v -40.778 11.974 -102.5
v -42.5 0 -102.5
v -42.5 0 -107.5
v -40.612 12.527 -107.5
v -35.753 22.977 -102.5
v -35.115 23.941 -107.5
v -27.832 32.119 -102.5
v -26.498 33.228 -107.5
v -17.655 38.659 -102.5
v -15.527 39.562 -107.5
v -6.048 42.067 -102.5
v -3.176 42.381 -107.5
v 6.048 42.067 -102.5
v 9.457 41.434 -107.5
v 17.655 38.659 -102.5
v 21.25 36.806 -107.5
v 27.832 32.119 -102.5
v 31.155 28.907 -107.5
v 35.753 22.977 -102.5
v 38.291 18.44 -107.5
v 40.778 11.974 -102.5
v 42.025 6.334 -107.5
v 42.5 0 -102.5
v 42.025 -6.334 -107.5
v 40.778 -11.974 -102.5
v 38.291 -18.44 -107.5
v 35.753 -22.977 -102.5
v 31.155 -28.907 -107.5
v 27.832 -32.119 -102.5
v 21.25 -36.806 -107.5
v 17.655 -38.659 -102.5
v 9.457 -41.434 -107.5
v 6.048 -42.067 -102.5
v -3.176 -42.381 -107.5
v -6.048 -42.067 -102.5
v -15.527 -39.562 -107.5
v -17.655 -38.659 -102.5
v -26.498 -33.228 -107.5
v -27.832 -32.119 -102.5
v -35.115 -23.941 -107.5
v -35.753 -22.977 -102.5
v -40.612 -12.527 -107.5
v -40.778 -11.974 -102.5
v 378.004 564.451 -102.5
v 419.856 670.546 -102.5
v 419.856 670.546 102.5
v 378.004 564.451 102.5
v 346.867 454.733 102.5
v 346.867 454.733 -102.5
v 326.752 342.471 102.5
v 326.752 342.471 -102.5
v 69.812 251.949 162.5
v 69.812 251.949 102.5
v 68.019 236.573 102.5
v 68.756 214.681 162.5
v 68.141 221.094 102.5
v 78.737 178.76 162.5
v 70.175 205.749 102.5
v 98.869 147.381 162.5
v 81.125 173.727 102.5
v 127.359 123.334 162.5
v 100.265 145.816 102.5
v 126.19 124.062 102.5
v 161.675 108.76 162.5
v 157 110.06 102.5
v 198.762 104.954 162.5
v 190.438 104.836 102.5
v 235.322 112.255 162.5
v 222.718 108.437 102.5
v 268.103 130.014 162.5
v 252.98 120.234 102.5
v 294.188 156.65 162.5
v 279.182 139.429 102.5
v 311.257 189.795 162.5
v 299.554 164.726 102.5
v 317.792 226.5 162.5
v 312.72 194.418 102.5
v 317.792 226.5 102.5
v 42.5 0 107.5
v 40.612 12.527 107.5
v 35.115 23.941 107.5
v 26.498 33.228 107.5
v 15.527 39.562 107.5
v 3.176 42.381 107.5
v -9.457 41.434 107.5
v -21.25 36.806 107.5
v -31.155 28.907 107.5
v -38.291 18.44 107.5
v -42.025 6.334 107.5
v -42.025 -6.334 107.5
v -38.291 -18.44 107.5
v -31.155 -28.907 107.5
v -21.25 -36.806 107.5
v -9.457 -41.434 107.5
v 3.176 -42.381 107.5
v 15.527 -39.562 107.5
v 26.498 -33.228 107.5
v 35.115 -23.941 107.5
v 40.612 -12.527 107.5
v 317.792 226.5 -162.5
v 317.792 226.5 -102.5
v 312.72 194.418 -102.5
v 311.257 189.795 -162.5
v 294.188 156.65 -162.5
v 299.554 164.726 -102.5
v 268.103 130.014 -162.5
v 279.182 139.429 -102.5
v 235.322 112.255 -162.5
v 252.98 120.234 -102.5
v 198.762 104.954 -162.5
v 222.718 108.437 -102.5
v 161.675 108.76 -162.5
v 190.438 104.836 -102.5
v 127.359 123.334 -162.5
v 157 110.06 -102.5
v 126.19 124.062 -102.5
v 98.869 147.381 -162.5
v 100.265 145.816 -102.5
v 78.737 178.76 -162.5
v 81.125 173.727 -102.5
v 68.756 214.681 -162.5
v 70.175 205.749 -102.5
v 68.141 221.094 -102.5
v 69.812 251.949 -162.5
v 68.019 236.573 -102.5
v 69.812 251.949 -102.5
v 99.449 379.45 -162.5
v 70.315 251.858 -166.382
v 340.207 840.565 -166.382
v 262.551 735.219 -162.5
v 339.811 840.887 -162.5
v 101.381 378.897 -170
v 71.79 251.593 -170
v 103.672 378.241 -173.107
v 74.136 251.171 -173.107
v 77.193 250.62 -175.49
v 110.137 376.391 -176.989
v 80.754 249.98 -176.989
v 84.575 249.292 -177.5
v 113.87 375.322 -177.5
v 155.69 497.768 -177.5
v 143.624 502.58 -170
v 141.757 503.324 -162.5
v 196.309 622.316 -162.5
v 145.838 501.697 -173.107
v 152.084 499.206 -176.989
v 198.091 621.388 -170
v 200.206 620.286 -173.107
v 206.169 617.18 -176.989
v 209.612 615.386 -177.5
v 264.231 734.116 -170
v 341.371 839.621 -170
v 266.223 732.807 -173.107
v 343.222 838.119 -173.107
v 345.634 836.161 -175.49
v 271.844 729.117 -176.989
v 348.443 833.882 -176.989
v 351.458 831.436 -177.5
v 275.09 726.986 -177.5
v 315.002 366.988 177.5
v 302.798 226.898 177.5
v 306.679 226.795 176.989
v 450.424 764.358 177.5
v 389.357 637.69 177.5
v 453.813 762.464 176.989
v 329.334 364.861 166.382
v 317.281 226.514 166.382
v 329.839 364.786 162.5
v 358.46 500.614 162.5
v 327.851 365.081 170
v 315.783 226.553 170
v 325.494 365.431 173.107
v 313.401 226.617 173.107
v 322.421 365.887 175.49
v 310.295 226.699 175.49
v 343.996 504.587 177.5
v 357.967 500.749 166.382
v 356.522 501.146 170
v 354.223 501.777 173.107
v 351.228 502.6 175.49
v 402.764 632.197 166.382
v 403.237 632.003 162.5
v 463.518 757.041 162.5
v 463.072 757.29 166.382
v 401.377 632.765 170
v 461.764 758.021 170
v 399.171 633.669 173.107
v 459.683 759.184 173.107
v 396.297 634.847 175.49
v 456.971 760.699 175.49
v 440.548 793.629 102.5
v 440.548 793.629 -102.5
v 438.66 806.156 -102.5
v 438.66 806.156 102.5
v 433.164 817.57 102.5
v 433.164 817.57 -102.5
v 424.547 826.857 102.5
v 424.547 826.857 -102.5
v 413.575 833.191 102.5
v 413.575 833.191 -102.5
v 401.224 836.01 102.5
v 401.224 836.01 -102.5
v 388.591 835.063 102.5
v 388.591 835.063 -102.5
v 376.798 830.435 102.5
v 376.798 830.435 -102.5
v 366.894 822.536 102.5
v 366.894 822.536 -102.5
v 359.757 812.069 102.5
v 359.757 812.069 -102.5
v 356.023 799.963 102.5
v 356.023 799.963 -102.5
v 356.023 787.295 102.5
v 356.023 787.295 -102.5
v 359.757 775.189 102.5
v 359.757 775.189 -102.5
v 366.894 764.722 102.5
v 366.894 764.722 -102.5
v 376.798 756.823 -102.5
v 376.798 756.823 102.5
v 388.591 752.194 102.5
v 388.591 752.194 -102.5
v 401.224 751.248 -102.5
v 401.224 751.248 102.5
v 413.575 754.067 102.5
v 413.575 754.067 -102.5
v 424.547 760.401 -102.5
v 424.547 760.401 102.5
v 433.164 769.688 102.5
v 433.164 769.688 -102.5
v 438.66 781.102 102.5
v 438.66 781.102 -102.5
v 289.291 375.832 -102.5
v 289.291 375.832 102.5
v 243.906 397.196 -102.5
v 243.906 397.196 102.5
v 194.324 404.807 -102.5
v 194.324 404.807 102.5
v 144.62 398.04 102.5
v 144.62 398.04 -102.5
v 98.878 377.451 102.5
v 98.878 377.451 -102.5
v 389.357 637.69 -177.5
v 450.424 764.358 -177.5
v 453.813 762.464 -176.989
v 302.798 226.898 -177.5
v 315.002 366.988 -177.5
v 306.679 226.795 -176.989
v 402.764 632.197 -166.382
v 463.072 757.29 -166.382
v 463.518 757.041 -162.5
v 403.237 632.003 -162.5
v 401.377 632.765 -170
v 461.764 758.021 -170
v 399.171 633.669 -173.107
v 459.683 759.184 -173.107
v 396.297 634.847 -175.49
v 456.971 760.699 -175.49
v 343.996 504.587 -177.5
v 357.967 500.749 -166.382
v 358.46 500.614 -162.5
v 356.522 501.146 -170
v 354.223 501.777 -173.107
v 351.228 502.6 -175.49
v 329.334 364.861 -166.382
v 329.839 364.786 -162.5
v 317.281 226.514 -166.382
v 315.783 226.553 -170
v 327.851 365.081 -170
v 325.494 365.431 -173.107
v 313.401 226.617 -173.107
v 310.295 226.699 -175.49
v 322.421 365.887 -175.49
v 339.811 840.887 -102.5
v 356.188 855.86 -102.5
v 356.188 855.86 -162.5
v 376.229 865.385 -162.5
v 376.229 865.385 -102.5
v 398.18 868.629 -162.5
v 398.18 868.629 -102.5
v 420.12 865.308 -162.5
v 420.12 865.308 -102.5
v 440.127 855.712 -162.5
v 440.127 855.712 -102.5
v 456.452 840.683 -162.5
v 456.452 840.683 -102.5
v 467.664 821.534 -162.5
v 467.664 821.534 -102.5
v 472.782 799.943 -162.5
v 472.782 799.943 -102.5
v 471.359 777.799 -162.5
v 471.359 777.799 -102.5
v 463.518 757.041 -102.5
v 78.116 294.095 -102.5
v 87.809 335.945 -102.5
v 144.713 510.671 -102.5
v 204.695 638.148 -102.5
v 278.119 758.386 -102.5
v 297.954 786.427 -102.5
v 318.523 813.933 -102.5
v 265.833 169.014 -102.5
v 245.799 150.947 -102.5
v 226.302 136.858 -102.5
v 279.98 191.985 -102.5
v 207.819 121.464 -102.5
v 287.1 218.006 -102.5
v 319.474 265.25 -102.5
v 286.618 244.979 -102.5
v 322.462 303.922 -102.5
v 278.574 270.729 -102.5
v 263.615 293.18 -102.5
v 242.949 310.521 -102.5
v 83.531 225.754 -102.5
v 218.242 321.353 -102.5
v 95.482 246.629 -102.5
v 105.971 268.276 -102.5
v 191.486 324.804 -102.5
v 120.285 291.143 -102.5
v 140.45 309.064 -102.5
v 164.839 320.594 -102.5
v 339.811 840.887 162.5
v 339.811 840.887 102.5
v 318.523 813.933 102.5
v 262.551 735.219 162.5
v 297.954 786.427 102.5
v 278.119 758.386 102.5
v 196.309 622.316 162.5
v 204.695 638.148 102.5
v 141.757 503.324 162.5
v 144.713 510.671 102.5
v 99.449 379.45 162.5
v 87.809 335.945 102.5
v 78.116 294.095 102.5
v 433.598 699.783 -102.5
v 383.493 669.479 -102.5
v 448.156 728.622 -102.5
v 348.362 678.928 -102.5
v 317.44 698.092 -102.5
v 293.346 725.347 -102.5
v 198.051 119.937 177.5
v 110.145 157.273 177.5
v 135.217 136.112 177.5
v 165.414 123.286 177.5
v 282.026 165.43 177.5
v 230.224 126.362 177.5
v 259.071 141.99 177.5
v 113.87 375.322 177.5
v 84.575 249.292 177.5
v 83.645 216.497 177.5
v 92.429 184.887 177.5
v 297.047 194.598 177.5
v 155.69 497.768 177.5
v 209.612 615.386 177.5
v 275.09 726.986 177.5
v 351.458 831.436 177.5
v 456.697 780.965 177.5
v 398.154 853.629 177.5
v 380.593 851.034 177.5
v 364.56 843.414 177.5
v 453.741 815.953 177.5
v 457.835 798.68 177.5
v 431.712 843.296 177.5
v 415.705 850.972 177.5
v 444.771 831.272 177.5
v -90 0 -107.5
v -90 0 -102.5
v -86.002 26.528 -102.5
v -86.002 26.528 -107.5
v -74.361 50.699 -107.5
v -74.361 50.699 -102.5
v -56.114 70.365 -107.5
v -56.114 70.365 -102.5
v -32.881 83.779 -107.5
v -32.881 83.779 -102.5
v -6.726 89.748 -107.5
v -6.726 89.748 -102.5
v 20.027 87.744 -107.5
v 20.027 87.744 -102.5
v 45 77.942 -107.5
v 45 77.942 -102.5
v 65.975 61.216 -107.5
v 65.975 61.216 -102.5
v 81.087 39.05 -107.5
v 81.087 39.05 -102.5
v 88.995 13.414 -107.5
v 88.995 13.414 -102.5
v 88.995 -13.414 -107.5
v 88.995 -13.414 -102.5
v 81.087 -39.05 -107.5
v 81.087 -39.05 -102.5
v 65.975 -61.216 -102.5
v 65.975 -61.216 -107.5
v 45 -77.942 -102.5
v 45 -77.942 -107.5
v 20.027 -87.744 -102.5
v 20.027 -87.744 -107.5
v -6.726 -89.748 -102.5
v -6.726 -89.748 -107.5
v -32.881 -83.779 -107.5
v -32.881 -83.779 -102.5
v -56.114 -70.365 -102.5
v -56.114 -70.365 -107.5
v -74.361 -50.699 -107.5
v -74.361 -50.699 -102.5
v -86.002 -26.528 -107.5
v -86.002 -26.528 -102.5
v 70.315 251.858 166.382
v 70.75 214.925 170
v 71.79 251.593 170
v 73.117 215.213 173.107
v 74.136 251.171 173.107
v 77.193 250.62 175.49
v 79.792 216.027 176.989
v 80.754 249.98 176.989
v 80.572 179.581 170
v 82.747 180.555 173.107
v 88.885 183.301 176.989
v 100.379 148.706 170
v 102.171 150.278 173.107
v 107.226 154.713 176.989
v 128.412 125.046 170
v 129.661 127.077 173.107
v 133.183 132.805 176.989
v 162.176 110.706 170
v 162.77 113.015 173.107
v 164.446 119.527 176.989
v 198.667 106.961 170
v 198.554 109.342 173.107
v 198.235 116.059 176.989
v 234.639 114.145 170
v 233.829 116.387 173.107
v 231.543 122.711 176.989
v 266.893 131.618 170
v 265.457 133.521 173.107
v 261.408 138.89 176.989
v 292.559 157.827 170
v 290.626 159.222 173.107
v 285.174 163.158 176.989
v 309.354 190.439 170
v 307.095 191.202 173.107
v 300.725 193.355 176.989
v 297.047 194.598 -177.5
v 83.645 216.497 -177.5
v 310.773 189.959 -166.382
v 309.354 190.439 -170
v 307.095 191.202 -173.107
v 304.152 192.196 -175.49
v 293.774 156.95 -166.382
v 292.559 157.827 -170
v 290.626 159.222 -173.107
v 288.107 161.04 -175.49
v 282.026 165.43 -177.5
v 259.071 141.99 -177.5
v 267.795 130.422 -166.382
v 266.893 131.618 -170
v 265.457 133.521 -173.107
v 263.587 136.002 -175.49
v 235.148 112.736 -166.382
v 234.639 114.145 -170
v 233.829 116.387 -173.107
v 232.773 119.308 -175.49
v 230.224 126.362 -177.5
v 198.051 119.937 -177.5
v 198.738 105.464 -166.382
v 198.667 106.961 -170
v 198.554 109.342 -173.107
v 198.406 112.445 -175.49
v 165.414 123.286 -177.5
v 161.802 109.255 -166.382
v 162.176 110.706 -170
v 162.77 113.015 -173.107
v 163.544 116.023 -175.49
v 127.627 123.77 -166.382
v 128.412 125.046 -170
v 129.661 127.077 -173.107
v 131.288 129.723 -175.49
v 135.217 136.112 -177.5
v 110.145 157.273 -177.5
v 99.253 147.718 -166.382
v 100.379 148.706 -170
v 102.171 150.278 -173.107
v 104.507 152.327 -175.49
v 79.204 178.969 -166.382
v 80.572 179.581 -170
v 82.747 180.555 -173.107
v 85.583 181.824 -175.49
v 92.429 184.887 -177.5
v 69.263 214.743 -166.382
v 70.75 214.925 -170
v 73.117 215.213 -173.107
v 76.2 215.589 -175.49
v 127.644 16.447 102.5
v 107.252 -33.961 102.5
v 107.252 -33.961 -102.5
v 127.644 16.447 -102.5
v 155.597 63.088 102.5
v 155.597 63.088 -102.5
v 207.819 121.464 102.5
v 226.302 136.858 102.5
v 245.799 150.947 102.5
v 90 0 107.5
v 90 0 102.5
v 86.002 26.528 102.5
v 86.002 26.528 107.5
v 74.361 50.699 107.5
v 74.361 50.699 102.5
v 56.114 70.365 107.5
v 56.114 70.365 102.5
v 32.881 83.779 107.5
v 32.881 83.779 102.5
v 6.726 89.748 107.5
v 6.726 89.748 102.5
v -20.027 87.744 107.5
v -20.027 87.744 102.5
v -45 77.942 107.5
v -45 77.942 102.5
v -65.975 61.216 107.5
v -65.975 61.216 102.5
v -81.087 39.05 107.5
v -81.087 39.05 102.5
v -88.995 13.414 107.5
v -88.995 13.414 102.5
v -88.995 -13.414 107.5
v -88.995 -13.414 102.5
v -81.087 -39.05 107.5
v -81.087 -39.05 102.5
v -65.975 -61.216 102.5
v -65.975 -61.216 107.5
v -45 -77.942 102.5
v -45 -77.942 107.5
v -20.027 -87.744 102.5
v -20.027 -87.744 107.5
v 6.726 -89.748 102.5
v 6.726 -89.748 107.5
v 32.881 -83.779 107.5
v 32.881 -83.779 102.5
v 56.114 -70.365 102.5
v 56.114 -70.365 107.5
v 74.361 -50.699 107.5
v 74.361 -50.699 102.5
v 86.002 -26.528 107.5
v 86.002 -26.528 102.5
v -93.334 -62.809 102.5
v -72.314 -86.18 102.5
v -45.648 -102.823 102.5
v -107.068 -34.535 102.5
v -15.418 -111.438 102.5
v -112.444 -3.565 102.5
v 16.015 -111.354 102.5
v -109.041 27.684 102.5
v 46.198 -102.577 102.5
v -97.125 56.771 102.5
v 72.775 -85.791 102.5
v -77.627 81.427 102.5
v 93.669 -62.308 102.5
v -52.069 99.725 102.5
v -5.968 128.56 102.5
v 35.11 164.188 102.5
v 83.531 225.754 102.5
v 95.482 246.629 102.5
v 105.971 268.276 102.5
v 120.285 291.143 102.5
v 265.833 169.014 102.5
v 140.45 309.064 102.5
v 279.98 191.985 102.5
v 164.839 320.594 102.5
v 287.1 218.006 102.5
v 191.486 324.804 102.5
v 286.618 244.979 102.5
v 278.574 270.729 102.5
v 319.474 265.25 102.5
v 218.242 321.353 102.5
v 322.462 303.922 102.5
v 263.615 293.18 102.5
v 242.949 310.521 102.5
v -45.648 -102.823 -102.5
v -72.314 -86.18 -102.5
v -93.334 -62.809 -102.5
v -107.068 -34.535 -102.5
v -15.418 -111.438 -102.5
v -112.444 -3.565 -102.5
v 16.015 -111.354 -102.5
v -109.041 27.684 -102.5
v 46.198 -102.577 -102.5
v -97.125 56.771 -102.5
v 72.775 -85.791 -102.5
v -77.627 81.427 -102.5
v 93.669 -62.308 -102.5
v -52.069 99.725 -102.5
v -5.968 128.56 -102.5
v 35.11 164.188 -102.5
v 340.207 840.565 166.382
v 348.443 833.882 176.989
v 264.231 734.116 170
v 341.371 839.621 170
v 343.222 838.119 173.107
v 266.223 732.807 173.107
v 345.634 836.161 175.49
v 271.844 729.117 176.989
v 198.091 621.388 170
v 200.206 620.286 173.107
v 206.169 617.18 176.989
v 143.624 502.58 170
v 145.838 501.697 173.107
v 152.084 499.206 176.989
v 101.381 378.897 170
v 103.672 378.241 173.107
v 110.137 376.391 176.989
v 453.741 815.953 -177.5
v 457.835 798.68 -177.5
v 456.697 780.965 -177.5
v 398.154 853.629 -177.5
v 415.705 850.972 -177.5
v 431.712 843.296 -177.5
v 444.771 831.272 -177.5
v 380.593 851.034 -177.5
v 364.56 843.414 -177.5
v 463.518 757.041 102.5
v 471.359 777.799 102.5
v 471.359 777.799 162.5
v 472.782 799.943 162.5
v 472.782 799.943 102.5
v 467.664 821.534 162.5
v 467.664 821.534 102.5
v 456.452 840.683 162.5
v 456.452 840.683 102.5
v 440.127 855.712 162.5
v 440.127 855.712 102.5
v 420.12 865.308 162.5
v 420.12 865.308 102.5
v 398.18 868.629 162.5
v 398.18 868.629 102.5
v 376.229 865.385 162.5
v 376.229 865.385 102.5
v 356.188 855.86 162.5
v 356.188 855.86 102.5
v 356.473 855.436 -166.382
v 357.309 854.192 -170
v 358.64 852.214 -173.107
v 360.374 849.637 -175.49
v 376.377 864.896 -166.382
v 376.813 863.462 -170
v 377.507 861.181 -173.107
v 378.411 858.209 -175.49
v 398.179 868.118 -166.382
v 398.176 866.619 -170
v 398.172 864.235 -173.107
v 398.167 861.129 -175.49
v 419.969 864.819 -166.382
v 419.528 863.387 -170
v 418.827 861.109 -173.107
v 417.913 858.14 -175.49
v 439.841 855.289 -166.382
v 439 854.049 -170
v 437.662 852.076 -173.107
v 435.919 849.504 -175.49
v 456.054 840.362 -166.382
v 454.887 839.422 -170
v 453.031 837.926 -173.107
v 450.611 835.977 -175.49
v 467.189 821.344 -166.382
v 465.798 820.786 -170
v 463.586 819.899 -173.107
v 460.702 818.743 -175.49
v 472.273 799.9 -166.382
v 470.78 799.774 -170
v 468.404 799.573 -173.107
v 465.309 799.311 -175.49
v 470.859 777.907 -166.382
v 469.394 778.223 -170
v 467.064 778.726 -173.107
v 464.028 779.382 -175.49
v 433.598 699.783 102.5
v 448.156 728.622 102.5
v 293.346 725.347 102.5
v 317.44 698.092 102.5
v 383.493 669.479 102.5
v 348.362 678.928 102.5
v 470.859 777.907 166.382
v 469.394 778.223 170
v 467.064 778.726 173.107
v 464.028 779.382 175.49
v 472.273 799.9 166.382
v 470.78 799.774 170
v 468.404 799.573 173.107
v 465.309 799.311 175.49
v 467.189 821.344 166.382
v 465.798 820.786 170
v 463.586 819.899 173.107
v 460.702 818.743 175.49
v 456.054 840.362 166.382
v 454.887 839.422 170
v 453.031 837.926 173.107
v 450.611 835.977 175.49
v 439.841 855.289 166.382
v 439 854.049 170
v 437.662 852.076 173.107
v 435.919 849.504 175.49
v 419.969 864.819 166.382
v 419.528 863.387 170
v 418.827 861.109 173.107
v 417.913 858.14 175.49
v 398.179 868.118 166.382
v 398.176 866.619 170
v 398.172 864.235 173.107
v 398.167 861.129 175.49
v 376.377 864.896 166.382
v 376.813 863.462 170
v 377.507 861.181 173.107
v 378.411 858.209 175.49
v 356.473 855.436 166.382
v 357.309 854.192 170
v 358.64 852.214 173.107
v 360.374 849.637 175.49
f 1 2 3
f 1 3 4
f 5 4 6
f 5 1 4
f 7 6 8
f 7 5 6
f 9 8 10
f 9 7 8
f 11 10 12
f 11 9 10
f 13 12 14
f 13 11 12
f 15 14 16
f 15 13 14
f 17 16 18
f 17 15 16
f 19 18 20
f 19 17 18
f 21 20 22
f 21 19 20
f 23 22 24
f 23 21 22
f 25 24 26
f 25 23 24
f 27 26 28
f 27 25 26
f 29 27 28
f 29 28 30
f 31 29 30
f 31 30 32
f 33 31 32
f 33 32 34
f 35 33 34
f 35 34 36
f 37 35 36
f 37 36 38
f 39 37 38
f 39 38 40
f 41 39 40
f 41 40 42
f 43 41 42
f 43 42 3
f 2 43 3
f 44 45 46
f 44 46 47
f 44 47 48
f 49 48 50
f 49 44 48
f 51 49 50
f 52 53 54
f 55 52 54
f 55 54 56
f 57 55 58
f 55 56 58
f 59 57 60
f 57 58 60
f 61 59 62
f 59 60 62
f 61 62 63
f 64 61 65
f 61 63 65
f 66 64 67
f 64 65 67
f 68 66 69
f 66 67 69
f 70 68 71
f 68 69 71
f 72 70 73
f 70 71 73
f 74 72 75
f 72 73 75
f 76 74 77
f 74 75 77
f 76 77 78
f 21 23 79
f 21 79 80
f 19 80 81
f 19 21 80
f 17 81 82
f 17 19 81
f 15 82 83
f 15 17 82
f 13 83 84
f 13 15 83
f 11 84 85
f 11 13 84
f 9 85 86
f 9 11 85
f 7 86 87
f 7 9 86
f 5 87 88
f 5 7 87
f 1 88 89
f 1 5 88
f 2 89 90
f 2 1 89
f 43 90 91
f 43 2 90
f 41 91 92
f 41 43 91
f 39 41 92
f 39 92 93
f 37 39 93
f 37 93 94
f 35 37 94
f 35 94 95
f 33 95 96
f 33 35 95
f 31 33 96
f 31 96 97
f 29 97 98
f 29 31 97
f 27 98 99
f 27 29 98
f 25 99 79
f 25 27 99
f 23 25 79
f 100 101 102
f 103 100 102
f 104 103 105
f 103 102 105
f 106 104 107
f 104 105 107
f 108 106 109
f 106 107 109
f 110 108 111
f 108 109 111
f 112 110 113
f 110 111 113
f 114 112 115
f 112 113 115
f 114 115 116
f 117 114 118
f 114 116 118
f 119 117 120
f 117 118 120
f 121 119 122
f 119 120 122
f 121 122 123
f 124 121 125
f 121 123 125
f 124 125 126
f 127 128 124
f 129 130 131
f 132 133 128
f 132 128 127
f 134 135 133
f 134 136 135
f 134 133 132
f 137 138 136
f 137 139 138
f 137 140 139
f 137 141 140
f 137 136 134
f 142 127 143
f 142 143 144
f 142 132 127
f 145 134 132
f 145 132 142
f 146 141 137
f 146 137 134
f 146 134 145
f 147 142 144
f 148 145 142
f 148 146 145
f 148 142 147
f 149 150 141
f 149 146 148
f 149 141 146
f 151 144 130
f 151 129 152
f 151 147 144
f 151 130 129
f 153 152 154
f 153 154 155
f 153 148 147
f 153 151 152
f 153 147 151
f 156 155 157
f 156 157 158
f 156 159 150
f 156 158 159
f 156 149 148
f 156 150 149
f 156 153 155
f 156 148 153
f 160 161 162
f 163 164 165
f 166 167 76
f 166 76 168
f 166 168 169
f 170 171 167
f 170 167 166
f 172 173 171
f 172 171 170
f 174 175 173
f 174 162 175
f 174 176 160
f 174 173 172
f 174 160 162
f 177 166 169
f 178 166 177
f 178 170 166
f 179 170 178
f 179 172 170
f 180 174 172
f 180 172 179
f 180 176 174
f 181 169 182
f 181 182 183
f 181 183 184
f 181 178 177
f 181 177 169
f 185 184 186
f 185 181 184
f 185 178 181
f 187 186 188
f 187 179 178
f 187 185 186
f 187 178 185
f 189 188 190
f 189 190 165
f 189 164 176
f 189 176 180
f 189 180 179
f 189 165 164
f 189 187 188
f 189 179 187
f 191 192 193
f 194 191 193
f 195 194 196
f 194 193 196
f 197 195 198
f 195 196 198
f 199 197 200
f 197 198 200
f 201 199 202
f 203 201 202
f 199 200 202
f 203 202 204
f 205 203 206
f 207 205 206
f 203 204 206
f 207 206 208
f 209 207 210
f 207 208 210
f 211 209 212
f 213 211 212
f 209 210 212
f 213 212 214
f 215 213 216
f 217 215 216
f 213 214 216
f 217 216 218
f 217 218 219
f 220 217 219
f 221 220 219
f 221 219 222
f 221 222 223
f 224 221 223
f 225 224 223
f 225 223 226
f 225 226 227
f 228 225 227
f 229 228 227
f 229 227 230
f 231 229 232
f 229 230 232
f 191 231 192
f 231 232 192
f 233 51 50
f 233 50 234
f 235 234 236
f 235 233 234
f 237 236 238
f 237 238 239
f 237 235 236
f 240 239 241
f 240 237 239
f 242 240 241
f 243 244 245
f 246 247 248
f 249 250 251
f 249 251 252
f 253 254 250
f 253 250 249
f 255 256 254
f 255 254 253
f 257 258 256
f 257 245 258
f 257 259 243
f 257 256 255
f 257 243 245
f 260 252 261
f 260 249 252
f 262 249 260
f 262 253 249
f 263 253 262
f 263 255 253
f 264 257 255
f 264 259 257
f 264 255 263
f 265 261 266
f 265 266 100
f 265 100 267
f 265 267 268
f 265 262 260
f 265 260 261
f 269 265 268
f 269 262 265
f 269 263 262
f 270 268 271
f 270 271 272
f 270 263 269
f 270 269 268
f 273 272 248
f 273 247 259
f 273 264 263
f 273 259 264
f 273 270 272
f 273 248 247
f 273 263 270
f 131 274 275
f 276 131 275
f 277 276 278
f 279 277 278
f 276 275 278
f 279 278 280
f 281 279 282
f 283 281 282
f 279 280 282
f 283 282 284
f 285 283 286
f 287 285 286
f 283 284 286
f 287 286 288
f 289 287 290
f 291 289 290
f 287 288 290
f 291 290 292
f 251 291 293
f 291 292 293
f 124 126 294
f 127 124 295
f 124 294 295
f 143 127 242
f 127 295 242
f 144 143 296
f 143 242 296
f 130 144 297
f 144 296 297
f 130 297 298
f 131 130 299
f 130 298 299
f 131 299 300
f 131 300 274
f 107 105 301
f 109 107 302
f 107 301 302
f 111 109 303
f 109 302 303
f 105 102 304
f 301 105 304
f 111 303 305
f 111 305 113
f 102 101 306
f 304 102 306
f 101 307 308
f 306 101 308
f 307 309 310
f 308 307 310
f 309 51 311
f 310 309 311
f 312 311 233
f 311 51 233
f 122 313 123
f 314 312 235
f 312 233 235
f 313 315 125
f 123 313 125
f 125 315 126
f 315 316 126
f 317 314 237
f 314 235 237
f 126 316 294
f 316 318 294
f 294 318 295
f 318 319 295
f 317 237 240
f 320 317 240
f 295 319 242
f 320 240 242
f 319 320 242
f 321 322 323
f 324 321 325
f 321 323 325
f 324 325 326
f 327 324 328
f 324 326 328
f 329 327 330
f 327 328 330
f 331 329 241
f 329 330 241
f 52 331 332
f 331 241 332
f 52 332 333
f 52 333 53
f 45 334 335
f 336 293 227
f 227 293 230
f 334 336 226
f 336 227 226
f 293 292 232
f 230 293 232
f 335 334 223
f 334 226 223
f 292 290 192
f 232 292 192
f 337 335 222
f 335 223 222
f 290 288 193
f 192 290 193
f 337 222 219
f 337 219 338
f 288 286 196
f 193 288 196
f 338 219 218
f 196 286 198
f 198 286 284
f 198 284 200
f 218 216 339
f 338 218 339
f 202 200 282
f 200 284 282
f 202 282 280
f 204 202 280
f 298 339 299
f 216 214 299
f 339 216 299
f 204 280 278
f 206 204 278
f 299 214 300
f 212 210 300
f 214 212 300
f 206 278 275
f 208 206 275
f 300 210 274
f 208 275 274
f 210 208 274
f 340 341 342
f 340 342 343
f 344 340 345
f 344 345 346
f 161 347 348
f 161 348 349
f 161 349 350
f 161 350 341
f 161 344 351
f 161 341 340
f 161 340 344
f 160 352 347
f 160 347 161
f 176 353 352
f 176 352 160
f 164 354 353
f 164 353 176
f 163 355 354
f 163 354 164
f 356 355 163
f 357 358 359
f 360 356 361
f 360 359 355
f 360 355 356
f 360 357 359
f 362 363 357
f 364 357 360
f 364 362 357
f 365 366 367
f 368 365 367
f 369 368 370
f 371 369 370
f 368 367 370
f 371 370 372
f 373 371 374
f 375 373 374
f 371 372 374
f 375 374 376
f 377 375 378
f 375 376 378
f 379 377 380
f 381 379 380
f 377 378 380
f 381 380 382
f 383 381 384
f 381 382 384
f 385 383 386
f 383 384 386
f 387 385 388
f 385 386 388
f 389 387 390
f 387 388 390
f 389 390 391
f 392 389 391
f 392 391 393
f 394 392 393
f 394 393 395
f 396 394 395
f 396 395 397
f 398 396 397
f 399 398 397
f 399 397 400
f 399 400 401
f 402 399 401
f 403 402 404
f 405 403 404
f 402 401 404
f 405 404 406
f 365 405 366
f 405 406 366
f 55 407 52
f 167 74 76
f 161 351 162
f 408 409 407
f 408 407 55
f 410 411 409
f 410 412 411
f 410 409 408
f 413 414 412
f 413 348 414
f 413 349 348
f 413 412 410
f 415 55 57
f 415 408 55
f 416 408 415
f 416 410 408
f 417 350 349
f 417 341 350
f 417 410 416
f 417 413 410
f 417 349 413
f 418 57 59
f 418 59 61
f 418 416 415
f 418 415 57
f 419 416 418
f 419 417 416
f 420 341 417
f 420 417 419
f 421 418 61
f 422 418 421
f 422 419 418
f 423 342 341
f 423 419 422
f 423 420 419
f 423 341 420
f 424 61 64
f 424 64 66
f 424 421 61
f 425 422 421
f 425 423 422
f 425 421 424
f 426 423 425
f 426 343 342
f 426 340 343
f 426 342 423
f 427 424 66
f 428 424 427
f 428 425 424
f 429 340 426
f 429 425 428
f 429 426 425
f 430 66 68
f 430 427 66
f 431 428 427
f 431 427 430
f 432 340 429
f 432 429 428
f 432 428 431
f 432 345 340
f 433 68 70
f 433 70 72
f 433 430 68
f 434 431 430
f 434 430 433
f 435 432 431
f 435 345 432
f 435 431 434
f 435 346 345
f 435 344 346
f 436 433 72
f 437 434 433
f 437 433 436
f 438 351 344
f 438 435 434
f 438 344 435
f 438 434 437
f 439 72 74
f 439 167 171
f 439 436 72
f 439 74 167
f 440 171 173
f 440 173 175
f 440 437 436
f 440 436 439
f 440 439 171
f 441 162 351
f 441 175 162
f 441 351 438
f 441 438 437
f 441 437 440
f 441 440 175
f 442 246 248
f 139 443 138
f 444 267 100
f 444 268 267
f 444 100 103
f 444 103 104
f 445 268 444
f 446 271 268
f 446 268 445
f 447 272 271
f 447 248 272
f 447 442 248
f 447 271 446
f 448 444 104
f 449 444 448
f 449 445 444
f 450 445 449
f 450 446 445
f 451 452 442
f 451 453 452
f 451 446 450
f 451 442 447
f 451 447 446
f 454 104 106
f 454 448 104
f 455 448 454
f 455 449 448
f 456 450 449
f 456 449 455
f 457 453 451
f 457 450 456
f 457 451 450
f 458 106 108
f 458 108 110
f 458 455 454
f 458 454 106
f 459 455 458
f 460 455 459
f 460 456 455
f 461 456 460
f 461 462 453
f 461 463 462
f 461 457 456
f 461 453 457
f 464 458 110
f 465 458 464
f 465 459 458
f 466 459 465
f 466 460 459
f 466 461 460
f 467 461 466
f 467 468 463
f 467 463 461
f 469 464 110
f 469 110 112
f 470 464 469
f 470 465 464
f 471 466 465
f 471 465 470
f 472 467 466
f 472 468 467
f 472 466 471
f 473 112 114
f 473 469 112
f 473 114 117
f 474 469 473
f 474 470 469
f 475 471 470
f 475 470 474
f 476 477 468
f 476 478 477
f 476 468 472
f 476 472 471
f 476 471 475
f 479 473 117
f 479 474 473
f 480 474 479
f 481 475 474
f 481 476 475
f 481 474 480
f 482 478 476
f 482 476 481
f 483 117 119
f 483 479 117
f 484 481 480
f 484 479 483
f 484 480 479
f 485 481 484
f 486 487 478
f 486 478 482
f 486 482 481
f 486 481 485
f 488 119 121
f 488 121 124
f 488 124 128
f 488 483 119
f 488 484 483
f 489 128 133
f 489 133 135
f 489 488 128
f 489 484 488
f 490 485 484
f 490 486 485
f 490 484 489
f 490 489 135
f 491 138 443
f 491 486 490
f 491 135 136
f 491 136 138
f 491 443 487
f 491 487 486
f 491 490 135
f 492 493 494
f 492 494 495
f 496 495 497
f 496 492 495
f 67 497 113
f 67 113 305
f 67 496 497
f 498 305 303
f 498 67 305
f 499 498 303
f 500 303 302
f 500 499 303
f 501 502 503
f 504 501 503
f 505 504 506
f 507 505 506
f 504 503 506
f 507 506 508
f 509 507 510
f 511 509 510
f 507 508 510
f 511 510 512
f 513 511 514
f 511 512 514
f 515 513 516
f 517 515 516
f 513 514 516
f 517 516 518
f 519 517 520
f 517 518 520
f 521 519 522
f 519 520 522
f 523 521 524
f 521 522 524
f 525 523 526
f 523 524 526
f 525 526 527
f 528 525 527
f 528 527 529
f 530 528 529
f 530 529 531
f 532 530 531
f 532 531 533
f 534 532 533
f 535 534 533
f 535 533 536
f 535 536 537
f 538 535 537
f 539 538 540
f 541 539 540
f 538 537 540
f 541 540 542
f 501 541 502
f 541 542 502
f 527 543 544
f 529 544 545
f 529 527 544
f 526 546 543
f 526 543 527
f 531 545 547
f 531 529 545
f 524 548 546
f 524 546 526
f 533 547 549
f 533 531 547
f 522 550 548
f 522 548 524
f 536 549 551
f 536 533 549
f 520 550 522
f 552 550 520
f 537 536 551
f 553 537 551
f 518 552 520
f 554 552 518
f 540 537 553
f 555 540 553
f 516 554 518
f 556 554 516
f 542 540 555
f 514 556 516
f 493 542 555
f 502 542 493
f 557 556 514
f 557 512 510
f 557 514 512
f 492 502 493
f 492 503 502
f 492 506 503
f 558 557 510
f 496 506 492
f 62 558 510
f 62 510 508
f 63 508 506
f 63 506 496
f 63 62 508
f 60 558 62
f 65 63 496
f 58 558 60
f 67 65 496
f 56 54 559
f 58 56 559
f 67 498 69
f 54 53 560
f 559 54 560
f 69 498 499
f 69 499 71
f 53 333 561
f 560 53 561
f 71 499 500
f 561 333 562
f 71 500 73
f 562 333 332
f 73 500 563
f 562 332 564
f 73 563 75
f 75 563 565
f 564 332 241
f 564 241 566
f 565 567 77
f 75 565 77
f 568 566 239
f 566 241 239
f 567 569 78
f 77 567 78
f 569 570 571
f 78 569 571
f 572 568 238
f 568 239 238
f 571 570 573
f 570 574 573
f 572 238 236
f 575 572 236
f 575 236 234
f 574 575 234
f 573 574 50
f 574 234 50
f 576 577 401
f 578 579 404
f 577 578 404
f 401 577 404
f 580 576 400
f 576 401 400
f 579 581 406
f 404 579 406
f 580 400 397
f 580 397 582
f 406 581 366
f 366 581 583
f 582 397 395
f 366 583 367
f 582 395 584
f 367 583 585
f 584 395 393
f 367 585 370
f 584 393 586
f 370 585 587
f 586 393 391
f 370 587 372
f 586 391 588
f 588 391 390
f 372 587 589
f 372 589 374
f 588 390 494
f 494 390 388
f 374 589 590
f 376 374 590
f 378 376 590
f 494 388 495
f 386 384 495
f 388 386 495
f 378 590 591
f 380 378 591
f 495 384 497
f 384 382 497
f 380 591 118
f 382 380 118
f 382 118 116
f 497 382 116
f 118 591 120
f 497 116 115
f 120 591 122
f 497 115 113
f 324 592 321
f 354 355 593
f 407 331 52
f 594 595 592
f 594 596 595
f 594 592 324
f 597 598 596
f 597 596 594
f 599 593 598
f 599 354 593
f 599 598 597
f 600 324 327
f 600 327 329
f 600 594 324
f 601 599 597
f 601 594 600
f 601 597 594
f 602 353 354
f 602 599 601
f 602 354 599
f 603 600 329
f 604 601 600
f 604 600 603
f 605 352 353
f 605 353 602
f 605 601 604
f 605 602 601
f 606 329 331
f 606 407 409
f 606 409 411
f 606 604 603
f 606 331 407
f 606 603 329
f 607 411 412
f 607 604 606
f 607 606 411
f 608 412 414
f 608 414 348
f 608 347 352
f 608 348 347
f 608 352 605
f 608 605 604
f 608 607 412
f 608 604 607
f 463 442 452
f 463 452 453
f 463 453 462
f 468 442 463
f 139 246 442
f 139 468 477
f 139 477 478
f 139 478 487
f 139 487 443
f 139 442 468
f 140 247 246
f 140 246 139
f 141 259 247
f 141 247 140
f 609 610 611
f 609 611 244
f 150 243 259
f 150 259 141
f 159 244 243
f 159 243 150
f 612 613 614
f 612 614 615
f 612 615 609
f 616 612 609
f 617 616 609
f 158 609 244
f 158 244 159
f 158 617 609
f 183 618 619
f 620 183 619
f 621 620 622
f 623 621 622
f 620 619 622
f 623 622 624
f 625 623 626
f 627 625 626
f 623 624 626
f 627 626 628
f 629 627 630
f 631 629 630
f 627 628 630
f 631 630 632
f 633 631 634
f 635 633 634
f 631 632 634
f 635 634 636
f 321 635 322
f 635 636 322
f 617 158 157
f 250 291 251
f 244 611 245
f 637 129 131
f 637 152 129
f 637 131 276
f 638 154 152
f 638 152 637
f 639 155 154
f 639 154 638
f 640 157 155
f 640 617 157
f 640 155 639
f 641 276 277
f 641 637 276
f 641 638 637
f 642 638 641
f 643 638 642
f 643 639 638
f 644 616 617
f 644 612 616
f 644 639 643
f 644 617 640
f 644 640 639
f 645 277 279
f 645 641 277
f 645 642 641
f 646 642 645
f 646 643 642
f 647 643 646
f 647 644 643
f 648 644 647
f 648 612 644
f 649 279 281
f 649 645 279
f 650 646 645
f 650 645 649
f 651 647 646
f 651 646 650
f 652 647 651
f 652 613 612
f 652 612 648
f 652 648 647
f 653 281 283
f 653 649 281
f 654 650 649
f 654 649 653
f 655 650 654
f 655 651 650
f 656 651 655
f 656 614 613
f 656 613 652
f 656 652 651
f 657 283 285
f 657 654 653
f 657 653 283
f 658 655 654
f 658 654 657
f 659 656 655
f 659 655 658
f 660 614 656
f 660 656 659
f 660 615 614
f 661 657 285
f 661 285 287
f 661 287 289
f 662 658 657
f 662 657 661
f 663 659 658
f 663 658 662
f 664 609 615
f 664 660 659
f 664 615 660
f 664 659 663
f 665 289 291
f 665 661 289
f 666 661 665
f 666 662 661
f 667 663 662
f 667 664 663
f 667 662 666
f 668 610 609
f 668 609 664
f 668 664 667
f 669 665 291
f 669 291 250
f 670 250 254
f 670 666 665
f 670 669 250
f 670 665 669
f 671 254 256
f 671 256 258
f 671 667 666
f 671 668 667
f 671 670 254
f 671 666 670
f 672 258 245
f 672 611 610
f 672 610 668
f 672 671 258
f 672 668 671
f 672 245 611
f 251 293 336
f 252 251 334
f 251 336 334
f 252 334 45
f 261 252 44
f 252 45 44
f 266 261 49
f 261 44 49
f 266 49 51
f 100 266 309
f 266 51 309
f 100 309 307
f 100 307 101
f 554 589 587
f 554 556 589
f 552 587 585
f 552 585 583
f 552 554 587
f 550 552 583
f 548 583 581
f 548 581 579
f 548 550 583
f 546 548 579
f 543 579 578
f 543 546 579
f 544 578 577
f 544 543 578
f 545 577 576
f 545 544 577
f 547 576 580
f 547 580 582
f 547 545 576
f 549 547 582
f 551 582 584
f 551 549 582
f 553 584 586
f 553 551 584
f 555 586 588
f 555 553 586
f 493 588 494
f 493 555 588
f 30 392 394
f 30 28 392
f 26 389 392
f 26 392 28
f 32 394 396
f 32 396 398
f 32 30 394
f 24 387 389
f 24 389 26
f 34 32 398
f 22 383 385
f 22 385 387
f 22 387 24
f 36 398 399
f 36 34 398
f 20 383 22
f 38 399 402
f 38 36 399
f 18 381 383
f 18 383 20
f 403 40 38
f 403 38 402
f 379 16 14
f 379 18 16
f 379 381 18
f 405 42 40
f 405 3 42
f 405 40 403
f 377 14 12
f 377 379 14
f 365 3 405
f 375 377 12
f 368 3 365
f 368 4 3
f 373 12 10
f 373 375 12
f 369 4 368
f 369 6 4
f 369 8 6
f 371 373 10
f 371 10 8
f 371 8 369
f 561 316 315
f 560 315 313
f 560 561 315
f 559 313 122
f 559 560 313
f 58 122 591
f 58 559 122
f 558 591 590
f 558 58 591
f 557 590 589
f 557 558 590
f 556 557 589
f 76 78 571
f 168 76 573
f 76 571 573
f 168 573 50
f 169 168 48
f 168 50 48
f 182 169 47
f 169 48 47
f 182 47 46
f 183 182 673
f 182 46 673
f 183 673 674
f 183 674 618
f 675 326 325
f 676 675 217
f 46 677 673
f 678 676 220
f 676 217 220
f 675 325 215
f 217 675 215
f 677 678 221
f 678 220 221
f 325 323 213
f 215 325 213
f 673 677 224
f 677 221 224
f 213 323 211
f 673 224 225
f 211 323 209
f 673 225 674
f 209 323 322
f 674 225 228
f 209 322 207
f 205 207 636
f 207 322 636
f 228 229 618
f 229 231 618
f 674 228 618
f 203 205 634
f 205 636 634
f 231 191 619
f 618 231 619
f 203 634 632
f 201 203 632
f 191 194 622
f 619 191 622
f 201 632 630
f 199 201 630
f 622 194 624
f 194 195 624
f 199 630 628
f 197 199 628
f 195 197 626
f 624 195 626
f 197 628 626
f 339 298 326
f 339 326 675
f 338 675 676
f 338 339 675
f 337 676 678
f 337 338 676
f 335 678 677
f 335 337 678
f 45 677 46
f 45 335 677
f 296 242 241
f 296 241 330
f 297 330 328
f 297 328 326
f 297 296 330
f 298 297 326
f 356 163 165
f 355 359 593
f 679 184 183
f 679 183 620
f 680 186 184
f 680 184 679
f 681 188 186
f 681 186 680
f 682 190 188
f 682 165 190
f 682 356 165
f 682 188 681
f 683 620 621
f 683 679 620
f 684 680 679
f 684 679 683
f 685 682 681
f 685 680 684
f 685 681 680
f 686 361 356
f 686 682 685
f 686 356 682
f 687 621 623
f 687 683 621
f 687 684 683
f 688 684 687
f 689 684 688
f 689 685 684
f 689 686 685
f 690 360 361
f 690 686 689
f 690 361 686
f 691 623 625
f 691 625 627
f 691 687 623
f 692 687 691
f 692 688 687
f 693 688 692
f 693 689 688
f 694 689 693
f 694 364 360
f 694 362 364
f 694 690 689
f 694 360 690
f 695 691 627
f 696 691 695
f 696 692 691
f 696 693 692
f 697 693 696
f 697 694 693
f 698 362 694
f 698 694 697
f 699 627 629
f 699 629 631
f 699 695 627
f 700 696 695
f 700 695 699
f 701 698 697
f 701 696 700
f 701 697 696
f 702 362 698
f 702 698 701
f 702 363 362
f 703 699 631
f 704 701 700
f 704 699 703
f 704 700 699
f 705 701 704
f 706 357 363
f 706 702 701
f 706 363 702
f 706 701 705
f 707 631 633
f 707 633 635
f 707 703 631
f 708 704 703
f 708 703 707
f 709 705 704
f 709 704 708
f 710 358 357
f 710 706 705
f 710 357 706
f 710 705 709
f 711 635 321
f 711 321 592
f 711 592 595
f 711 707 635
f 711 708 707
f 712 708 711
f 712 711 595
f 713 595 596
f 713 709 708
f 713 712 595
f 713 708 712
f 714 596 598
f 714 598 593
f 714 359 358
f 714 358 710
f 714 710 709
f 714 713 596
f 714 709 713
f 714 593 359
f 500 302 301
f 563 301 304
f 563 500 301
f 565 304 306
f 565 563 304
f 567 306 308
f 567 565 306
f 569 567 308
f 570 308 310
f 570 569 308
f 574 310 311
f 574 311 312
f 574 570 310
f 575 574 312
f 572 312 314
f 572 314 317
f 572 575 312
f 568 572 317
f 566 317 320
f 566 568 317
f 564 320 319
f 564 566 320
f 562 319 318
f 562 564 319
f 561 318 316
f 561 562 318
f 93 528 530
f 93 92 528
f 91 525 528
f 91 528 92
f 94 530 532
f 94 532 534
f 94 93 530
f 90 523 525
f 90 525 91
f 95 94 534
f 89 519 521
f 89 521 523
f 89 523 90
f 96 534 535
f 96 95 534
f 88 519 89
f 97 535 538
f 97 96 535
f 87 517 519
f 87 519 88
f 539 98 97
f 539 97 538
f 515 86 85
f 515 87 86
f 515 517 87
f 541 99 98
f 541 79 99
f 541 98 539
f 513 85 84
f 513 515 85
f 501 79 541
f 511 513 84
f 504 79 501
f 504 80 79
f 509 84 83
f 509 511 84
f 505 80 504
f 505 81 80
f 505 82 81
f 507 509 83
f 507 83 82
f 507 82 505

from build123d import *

# Parameters (mm, degrees)
SKETCH1_R           = 42.5
BOSS_EXTRUDE1_DEPTH = 102.5
SKETCH2_R           = 90
SKETCH2_R_2         = 42.5
BOSS_EXTRUDE2_DEPTH = 5
SKETCH3_R           = 90
SKETCH3_R_2         = 42.5
BOSS_EXTRUDE3_DEPTH = 5
BOSS_EXTRUDE4_DEPTH = 75
BOSS_EXTRUDE5_DEPTH = 75
FILLET2_R           = 15
SKETCH6_R           = 42.5
BOSS_EXTRUDE6_DEPTH = 205


with BuildPart() as part:
    # Sketch1 → Boss-Extrude1 (new body, symmetric)
    with BuildSketch(Plane.XY):
        with BuildLine():
            ThreePointArc((-52.068634079, 99.725159038), (-72.31360609, -86.179999851), (107.251733212, -33.960502395))
            ThreePointArc((107.251733212, -33.960502395), (160.82695798, 70.255427056), (245.798784868, 150.946525051))
            ThreePointArc((245.798784868, 150.946525051), (253.901105826, 302.587555032), (105.970797095, 268.276138019))
            ThreePointArc((105.970797095, 268.276138019), (41.260781083, 170.583361992), (-52.068634079, 99.725159038))
        make_face()
        Circle(SKETCH1_R, mode=Mode.SUBTRACT)
    extrude(amount=BOSS_EXTRUDE1_DEPTH, both=True)

    # Sketch2 → Boss-Extrude2 (add)
    with BuildSketch(Plane.XY.offset(102.5)):
        Circle(SKETCH2_R)
        Circle(SKETCH2_R_2, mode=Mode.SUBTRACT)
    extrude(amount=BOSS_EXTRUDE2_DEPTH)

    # Sketch3 → Boss-Extrude3 (add)
    with BuildSketch(Plane(origin=(0, 0, -102.5), x_dir=(-1, 0, 0), z_dir=(0, 0, -1))):
        Circle(SKETCH3_R)
        Circle(SKETCH3_R_2, mode=Mode.SUBTRACT)
    extrude(amount=BOSS_EXTRUDE3_DEPTH)

    # Sketch4 → Boss-Extrude4 (add)
    with BuildSketch(Plane.XY.offset(102.5)):
        with BuildLine():
            ThreePointArc((339.810505034, 840.887250831), (167.534603821, 563.507294819), (69.811758527, 251.948517629))
            ThreePointArc((69.811758527, 251.948517629), (180.075530777, 105.466386029), (317.792368114, 226.500212138))
            ThreePointArc((317.792368114, 226.500212138), (358.459856731, 500.613644392), (463.518163787, 757.040574513))
            ThreePointArc((463.518163787, 757.040574513), (440.127359965, 855.712385585), (339.810505034, 840.887250831))
        make_face()
    extrude(amount=BOSS_EXTRUDE4_DEPTH)

    # Sketch5 → Boss-Extrude5 (add)
    with BuildSketch(Plane(origin=(0, 0, -102.5), x_dir=(-1, 0, 0), z_dir=(0, 0, -1))):
        with BuildLine():
            ThreePointArc((-317.792368114, 226.500212138), (-180.075530777, 105.466386029), (-69.811758527, 251.948517629))
            ThreePointArc((-69.811758527, 251.948517629), (-167.534603821, 563.507294819), (-339.810505034, 840.887250831))
            ThreePointArc((-339.810505034, 840.887250831), (-440.127359965, 855.712385585), (-463.518163787, 757.040574513))
            ThreePointArc((-463.518163787, 757.040574513), (-358.459856731, 500.613644392), (-317.792368114, 226.500212138))
        make_face()
    extrude(amount=BOSS_EXTRUDE5_DEPTH)

    # Fillet2
    fillet2_edges = [part.edges().sort_by_distance(p)[0] for p in [
        (167.534603821, 563.507294819, 177.5),
        (180.075530777, 105.466386029, 177.5),
        (358.459856731, 500.613644392, 177.5),
        (440.127359965, 855.712385585, 177.5),
        (358.459856731, 500.613644392, -177.5),
        (180.075530777, 105.466386029, -177.5),
        (167.534603821, 563.507294819, -177.5),
        (440.127359965, 855.712385585, -177.5),
    ]]
    fillet(fillet2_edges, radius=FILLET2_R)

    # Sketch6 → Boss-Extrude6 (add)
    with BuildSketch(Plane.XY.offset(-102.5)):
        with Locations((398.048368901, 793.628905407)):
            Circle(SKETCH6_R)
        with BuildLine():
            ThreePointArc((419.855651368, 670.545834145), (361.07481022, 509.978649739), (326.751661219, 342.470651611))
            ThreePointArc((326.751661219, 342.470651611), (219.389147641, 402.787161518), (98.878270441, 377.451037787))
            ThreePointArc((98.878270441, 377.451037787), (172.976016961, 575.222465787), (278.119497696, 758.385950771))
            ThreePointArc((278.119497696, 758.385950771), (332.200566612, 687.378884543), (419.855651368, 670.545834145))
        make_face()
    extrude(amount=BOSS_EXTRUDE6_DEPTH)


solid = part.part
